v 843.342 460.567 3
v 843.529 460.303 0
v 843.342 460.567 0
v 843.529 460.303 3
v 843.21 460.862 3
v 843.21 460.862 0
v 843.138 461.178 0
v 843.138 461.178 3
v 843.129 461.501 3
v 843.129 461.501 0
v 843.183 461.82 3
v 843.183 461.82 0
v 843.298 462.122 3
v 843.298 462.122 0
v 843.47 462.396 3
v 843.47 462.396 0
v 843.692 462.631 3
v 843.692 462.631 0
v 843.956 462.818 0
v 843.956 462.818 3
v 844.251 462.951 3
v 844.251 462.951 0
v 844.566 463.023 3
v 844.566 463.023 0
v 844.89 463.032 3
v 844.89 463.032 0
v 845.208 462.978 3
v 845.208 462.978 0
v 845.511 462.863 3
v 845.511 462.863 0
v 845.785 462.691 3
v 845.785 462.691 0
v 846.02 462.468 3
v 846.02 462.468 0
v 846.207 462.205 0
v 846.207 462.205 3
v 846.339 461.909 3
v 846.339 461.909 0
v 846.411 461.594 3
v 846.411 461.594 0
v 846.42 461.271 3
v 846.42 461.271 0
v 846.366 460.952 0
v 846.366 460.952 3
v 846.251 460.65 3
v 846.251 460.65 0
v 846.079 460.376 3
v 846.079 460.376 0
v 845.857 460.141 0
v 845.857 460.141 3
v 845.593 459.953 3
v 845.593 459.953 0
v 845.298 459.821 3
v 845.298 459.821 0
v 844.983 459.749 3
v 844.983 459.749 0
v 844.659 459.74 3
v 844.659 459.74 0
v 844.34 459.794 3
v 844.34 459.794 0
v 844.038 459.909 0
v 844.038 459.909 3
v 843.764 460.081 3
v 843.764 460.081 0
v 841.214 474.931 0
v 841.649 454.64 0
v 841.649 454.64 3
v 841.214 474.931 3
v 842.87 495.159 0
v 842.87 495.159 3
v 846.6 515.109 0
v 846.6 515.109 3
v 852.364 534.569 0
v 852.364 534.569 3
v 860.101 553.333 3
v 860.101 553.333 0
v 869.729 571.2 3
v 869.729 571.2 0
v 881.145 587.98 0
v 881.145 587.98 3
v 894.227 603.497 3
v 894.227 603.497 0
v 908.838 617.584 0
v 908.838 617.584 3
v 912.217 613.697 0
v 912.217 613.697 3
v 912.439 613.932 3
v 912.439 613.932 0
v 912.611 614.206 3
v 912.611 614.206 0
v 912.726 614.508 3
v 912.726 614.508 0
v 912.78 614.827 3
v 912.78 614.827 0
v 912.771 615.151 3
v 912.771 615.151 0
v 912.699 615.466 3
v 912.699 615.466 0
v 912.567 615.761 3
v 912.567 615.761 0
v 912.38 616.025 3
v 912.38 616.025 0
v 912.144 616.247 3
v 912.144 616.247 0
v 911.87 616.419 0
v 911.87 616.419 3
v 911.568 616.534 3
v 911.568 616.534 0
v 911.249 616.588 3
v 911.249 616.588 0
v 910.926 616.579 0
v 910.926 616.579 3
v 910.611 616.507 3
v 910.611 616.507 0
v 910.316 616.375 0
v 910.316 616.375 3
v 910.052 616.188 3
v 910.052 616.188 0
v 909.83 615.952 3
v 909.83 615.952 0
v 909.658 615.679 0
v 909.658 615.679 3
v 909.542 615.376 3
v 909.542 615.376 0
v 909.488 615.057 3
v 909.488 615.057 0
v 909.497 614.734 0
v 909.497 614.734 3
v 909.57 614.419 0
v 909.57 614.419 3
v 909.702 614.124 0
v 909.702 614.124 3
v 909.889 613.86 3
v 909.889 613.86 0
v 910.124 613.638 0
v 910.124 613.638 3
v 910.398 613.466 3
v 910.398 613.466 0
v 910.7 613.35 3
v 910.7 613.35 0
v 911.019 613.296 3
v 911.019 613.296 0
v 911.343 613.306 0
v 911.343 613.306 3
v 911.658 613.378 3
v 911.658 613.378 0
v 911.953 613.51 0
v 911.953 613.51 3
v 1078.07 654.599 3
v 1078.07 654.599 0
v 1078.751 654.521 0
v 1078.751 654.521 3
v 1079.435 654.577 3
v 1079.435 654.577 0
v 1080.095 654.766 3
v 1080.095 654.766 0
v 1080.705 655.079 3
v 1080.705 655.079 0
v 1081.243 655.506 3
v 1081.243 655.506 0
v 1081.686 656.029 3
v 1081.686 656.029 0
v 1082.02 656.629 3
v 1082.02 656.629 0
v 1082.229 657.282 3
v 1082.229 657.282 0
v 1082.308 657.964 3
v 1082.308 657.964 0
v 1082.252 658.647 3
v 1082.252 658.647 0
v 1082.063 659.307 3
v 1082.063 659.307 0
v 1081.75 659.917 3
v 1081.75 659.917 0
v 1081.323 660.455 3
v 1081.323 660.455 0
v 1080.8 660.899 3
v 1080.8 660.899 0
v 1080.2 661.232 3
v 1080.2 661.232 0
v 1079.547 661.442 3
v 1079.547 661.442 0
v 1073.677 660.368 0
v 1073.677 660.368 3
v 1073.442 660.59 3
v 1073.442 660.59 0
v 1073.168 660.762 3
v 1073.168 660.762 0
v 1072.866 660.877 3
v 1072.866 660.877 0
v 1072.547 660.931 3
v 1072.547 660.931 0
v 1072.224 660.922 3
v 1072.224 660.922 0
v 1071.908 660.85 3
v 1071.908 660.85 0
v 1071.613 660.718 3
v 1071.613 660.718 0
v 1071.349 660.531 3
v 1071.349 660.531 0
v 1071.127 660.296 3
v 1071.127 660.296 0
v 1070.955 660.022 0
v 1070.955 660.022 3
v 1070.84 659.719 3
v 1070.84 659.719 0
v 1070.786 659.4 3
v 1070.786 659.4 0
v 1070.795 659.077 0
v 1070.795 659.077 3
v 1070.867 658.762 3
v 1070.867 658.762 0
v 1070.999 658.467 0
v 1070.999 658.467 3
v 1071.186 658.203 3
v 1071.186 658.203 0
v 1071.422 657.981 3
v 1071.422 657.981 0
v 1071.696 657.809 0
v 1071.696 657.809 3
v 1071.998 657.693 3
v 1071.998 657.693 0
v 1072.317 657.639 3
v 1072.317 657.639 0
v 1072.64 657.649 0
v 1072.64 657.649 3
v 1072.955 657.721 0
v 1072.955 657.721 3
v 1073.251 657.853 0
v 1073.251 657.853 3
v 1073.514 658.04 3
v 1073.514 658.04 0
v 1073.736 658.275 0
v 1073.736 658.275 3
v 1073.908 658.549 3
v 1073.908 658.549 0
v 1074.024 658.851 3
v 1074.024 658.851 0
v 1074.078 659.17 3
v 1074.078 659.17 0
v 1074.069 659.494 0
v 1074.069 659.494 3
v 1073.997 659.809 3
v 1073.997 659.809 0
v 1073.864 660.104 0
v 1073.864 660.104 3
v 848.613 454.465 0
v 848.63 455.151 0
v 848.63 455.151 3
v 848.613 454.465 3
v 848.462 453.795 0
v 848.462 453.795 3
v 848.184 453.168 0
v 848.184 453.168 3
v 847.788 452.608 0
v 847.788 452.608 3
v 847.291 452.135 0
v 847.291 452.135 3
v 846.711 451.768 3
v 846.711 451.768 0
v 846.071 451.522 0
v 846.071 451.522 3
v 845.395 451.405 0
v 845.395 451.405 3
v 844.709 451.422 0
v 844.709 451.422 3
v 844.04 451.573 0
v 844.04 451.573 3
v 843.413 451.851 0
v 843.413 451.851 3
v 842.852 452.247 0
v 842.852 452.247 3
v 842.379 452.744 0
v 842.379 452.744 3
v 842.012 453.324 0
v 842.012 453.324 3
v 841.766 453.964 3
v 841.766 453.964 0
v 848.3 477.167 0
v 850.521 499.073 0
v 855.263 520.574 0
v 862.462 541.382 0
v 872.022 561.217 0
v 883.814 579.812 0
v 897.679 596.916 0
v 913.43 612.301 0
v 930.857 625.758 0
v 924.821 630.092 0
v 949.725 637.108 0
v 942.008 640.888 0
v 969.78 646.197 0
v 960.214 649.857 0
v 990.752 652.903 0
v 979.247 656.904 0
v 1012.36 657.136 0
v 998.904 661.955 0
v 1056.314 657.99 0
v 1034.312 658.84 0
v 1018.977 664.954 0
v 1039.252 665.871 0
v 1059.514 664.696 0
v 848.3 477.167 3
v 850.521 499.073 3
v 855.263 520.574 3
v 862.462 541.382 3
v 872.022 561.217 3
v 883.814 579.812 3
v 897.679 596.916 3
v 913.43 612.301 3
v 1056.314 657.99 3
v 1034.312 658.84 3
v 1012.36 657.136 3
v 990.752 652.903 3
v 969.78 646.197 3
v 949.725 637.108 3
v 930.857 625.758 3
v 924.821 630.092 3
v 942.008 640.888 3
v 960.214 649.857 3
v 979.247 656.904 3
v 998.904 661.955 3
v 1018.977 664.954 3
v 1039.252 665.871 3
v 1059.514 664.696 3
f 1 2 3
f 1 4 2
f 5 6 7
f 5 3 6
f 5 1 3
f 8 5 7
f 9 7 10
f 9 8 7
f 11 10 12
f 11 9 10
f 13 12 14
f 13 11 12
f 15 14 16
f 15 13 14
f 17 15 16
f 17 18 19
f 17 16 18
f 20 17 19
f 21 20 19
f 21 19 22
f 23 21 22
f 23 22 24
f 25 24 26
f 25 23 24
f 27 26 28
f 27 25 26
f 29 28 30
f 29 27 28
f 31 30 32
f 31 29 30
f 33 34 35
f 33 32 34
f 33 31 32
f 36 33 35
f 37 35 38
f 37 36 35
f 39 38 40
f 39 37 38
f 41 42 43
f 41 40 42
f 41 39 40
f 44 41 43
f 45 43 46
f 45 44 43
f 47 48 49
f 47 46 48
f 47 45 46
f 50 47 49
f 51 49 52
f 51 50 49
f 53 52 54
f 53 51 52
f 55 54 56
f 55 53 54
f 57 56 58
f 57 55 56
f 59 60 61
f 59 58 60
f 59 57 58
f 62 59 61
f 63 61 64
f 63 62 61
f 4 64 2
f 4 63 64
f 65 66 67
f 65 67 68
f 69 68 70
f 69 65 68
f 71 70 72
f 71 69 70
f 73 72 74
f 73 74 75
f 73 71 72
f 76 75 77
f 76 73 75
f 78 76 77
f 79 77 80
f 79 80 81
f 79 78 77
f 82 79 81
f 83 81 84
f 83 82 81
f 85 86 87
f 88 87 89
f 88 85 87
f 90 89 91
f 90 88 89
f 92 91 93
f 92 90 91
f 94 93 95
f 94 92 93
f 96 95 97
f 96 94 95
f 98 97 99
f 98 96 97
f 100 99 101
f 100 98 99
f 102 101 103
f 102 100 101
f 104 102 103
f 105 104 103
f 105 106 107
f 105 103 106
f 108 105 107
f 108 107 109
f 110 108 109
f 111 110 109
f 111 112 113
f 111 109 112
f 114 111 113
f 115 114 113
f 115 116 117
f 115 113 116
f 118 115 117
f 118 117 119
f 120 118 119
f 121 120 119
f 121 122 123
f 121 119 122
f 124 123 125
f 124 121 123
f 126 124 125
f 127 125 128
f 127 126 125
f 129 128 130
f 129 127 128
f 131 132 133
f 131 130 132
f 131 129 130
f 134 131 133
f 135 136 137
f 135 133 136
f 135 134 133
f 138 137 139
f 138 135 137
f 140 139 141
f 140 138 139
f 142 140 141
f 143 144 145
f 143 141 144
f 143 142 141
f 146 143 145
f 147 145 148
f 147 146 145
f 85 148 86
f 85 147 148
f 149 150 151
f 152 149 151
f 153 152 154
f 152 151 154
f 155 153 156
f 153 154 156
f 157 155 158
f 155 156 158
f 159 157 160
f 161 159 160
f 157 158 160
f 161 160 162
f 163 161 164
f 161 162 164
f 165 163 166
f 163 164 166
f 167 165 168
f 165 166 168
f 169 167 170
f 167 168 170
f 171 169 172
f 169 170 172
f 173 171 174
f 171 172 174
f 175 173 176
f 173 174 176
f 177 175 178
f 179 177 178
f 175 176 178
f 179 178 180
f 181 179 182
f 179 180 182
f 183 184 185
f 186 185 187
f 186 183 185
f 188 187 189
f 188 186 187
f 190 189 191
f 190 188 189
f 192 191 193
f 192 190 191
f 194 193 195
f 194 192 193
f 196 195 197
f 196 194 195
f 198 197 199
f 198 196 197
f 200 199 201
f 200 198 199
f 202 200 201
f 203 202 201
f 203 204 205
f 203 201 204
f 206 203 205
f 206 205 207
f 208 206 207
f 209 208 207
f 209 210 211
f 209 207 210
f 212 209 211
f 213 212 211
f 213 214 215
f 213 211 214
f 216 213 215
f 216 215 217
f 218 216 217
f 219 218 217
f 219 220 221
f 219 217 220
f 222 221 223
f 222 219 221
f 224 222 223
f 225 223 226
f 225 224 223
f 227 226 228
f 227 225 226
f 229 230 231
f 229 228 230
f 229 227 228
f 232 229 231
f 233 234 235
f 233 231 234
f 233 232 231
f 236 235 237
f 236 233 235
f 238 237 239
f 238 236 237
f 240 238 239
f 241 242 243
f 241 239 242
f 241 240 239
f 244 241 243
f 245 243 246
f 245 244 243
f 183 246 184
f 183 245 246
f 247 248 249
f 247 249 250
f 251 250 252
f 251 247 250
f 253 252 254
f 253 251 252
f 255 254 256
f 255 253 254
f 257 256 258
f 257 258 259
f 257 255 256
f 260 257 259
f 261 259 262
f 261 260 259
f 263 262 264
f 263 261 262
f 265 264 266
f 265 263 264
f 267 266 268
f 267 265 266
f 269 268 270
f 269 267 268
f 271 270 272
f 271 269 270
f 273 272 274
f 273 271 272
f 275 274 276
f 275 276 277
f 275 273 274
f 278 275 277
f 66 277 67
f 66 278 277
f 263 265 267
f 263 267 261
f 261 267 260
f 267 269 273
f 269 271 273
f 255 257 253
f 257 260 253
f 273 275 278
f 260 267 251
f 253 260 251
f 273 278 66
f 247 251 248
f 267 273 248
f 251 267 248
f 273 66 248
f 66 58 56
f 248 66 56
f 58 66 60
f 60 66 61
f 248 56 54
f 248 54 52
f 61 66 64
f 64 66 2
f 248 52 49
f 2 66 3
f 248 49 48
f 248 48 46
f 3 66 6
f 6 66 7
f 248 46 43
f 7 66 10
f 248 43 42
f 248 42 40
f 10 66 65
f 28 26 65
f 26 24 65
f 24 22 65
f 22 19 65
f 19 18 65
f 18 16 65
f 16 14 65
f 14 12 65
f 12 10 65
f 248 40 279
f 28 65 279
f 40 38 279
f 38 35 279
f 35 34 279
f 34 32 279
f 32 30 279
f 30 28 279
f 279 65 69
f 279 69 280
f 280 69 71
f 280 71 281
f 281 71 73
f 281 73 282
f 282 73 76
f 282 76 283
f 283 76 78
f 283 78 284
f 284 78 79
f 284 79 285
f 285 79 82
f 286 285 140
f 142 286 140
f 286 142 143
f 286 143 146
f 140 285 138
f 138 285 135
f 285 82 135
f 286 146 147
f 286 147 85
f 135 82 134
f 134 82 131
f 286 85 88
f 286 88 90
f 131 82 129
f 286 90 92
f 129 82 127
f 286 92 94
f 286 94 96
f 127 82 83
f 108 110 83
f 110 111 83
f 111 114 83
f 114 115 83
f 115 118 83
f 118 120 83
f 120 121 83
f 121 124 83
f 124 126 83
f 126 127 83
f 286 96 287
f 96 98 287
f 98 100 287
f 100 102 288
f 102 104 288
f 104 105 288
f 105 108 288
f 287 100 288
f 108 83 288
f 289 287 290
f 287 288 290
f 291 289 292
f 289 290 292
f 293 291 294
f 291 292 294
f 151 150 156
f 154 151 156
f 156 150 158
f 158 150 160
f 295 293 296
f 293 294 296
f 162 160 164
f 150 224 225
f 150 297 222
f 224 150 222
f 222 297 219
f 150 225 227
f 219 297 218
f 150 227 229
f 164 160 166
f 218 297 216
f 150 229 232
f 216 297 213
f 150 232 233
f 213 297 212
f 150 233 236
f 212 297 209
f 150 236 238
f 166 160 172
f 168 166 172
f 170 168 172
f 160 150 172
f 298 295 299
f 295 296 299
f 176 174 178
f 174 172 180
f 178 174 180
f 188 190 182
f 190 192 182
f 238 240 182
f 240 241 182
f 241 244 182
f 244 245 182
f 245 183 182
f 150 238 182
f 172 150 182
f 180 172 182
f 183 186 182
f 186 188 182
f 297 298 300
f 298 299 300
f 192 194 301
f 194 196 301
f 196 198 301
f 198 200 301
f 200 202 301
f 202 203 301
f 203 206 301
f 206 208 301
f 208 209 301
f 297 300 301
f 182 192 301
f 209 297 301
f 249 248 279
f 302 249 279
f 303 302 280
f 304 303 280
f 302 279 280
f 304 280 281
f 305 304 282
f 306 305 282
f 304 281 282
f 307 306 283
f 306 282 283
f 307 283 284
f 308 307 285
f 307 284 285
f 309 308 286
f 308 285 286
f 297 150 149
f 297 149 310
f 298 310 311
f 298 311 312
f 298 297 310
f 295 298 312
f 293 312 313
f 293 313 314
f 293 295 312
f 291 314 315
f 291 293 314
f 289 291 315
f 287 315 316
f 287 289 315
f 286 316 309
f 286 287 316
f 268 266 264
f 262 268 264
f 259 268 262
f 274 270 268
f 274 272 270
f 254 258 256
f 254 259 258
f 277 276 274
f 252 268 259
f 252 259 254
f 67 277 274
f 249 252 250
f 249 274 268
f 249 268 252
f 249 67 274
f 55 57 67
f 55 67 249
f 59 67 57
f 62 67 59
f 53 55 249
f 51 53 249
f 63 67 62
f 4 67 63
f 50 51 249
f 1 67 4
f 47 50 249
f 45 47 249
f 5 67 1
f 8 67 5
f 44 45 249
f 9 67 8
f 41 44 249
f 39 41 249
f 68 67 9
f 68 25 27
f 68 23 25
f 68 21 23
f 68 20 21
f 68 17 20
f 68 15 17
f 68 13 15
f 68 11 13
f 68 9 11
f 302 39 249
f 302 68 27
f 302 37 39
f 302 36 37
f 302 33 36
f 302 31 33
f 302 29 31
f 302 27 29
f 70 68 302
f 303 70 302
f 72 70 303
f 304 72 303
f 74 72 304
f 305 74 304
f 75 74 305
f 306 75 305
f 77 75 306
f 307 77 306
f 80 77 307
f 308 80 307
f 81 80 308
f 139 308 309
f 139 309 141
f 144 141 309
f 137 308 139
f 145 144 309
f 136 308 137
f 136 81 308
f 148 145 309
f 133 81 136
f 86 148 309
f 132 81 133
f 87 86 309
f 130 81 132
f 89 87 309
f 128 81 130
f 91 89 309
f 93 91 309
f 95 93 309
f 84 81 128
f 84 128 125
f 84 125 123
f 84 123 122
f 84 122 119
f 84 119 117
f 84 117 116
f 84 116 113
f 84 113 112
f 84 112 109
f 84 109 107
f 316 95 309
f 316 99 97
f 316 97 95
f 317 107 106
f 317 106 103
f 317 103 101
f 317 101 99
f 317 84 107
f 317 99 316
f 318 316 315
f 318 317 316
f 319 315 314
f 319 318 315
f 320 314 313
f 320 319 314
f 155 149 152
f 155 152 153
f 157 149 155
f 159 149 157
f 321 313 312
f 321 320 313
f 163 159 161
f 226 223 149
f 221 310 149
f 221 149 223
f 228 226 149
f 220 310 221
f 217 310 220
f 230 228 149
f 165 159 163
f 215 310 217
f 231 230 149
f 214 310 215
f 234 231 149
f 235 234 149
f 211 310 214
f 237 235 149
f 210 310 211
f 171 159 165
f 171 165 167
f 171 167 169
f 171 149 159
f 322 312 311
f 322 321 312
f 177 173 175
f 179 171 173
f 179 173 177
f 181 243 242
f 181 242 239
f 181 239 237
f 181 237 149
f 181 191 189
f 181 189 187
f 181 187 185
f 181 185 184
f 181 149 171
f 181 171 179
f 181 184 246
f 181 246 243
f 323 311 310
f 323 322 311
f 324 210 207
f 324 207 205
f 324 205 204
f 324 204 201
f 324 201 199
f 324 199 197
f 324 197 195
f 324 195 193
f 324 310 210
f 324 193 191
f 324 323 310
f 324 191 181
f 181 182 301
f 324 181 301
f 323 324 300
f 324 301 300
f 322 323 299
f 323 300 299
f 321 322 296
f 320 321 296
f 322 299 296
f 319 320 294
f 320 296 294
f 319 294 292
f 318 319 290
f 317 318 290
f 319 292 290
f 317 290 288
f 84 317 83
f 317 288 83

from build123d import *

# Parameters (mm, degrees)
PAD015_DEPTH                        = 3
SKETCH054_R                         = 1.65
POCKET018_DEPTH                     = 358.938883
POCKET018_DEPTH_BACK                = 361.938883
BODY001003005003004_PLACEMENT_ANGLE = 60
CLONE005_PLACEMENT_ANGLE            = 19


with BuildPart() as part:
    # Sketch053 → Pad015 (new body)
    with BuildSketch(Plane.XY):
        with BuildLine():
            ThreePointArc((152.005097, 113.785532), (84.992984, 169.790723), (0, 189.875477))
            Line((0, 189.875477), (0, 196.875477))
            ThreePointArc((157.608957, 117.98038), (88.126358, 176.050273), (0, 196.875477))
            ThreePointArc((152.005097, 113.785532), (156.904451, 113.081026), (157.608957, 117.98038))
        make_face()
    pad015 = extrude(amount=PAD015_DEPTH)

    # Sketch054 → Pocket018 (cut, two sides)
    with BuildSketch(Plane.XY) as pocket018_sk:
        with Locations((150.82443, 121.020933)):
            Circle(SKETCH054_R)
        with BuildLine():
            ThreePointArc((0, 191.725477), (1.65, 193.375477), (0, 195.025477))
            Line((0, 191.725477), (0, 195.025477))
        make_face()
    pocket018 = extrude(amount=-POCKET018_DEPTH, mode=Mode.SUBTRACT) + extrude(pocket018_sk.sketch, amount=POCKET018_DEPTH_BACK, mode=Mode.SUBTRACT)

    # Mirrored020: Pad015, Pocket018 across Sketch053 V_Axis
    add(pad015.mirror(Plane(origin=(0, 0, 0), x_dir=(0, 0, 1), z_dir=(1, 0, 0))))
    add(pocket018.mirror(Plane(origin=(0, 0, 0), x_dir=(0, 0, 1), z_dir=(1, 0, 0))), mode=Mode.SUBTRACT)


with BuildPart() as part_1:
    # Body001003005003004 placement: moved
    add(part.part.rotate(Axis((0, 0, 0), (0, 0, 1)), BODY001003005003004_PLACEMENT_ANGLE))


with BuildPart() as part_2:
    # Clone005 placement: moved
    add(part_1.part.moved(Location((1038, 469, 0))).rotate(Axis((1038, 469, 0), (0, 0, -1)), CLONE005_PLACEMENT_ANGLE))


solid = part_2.part
